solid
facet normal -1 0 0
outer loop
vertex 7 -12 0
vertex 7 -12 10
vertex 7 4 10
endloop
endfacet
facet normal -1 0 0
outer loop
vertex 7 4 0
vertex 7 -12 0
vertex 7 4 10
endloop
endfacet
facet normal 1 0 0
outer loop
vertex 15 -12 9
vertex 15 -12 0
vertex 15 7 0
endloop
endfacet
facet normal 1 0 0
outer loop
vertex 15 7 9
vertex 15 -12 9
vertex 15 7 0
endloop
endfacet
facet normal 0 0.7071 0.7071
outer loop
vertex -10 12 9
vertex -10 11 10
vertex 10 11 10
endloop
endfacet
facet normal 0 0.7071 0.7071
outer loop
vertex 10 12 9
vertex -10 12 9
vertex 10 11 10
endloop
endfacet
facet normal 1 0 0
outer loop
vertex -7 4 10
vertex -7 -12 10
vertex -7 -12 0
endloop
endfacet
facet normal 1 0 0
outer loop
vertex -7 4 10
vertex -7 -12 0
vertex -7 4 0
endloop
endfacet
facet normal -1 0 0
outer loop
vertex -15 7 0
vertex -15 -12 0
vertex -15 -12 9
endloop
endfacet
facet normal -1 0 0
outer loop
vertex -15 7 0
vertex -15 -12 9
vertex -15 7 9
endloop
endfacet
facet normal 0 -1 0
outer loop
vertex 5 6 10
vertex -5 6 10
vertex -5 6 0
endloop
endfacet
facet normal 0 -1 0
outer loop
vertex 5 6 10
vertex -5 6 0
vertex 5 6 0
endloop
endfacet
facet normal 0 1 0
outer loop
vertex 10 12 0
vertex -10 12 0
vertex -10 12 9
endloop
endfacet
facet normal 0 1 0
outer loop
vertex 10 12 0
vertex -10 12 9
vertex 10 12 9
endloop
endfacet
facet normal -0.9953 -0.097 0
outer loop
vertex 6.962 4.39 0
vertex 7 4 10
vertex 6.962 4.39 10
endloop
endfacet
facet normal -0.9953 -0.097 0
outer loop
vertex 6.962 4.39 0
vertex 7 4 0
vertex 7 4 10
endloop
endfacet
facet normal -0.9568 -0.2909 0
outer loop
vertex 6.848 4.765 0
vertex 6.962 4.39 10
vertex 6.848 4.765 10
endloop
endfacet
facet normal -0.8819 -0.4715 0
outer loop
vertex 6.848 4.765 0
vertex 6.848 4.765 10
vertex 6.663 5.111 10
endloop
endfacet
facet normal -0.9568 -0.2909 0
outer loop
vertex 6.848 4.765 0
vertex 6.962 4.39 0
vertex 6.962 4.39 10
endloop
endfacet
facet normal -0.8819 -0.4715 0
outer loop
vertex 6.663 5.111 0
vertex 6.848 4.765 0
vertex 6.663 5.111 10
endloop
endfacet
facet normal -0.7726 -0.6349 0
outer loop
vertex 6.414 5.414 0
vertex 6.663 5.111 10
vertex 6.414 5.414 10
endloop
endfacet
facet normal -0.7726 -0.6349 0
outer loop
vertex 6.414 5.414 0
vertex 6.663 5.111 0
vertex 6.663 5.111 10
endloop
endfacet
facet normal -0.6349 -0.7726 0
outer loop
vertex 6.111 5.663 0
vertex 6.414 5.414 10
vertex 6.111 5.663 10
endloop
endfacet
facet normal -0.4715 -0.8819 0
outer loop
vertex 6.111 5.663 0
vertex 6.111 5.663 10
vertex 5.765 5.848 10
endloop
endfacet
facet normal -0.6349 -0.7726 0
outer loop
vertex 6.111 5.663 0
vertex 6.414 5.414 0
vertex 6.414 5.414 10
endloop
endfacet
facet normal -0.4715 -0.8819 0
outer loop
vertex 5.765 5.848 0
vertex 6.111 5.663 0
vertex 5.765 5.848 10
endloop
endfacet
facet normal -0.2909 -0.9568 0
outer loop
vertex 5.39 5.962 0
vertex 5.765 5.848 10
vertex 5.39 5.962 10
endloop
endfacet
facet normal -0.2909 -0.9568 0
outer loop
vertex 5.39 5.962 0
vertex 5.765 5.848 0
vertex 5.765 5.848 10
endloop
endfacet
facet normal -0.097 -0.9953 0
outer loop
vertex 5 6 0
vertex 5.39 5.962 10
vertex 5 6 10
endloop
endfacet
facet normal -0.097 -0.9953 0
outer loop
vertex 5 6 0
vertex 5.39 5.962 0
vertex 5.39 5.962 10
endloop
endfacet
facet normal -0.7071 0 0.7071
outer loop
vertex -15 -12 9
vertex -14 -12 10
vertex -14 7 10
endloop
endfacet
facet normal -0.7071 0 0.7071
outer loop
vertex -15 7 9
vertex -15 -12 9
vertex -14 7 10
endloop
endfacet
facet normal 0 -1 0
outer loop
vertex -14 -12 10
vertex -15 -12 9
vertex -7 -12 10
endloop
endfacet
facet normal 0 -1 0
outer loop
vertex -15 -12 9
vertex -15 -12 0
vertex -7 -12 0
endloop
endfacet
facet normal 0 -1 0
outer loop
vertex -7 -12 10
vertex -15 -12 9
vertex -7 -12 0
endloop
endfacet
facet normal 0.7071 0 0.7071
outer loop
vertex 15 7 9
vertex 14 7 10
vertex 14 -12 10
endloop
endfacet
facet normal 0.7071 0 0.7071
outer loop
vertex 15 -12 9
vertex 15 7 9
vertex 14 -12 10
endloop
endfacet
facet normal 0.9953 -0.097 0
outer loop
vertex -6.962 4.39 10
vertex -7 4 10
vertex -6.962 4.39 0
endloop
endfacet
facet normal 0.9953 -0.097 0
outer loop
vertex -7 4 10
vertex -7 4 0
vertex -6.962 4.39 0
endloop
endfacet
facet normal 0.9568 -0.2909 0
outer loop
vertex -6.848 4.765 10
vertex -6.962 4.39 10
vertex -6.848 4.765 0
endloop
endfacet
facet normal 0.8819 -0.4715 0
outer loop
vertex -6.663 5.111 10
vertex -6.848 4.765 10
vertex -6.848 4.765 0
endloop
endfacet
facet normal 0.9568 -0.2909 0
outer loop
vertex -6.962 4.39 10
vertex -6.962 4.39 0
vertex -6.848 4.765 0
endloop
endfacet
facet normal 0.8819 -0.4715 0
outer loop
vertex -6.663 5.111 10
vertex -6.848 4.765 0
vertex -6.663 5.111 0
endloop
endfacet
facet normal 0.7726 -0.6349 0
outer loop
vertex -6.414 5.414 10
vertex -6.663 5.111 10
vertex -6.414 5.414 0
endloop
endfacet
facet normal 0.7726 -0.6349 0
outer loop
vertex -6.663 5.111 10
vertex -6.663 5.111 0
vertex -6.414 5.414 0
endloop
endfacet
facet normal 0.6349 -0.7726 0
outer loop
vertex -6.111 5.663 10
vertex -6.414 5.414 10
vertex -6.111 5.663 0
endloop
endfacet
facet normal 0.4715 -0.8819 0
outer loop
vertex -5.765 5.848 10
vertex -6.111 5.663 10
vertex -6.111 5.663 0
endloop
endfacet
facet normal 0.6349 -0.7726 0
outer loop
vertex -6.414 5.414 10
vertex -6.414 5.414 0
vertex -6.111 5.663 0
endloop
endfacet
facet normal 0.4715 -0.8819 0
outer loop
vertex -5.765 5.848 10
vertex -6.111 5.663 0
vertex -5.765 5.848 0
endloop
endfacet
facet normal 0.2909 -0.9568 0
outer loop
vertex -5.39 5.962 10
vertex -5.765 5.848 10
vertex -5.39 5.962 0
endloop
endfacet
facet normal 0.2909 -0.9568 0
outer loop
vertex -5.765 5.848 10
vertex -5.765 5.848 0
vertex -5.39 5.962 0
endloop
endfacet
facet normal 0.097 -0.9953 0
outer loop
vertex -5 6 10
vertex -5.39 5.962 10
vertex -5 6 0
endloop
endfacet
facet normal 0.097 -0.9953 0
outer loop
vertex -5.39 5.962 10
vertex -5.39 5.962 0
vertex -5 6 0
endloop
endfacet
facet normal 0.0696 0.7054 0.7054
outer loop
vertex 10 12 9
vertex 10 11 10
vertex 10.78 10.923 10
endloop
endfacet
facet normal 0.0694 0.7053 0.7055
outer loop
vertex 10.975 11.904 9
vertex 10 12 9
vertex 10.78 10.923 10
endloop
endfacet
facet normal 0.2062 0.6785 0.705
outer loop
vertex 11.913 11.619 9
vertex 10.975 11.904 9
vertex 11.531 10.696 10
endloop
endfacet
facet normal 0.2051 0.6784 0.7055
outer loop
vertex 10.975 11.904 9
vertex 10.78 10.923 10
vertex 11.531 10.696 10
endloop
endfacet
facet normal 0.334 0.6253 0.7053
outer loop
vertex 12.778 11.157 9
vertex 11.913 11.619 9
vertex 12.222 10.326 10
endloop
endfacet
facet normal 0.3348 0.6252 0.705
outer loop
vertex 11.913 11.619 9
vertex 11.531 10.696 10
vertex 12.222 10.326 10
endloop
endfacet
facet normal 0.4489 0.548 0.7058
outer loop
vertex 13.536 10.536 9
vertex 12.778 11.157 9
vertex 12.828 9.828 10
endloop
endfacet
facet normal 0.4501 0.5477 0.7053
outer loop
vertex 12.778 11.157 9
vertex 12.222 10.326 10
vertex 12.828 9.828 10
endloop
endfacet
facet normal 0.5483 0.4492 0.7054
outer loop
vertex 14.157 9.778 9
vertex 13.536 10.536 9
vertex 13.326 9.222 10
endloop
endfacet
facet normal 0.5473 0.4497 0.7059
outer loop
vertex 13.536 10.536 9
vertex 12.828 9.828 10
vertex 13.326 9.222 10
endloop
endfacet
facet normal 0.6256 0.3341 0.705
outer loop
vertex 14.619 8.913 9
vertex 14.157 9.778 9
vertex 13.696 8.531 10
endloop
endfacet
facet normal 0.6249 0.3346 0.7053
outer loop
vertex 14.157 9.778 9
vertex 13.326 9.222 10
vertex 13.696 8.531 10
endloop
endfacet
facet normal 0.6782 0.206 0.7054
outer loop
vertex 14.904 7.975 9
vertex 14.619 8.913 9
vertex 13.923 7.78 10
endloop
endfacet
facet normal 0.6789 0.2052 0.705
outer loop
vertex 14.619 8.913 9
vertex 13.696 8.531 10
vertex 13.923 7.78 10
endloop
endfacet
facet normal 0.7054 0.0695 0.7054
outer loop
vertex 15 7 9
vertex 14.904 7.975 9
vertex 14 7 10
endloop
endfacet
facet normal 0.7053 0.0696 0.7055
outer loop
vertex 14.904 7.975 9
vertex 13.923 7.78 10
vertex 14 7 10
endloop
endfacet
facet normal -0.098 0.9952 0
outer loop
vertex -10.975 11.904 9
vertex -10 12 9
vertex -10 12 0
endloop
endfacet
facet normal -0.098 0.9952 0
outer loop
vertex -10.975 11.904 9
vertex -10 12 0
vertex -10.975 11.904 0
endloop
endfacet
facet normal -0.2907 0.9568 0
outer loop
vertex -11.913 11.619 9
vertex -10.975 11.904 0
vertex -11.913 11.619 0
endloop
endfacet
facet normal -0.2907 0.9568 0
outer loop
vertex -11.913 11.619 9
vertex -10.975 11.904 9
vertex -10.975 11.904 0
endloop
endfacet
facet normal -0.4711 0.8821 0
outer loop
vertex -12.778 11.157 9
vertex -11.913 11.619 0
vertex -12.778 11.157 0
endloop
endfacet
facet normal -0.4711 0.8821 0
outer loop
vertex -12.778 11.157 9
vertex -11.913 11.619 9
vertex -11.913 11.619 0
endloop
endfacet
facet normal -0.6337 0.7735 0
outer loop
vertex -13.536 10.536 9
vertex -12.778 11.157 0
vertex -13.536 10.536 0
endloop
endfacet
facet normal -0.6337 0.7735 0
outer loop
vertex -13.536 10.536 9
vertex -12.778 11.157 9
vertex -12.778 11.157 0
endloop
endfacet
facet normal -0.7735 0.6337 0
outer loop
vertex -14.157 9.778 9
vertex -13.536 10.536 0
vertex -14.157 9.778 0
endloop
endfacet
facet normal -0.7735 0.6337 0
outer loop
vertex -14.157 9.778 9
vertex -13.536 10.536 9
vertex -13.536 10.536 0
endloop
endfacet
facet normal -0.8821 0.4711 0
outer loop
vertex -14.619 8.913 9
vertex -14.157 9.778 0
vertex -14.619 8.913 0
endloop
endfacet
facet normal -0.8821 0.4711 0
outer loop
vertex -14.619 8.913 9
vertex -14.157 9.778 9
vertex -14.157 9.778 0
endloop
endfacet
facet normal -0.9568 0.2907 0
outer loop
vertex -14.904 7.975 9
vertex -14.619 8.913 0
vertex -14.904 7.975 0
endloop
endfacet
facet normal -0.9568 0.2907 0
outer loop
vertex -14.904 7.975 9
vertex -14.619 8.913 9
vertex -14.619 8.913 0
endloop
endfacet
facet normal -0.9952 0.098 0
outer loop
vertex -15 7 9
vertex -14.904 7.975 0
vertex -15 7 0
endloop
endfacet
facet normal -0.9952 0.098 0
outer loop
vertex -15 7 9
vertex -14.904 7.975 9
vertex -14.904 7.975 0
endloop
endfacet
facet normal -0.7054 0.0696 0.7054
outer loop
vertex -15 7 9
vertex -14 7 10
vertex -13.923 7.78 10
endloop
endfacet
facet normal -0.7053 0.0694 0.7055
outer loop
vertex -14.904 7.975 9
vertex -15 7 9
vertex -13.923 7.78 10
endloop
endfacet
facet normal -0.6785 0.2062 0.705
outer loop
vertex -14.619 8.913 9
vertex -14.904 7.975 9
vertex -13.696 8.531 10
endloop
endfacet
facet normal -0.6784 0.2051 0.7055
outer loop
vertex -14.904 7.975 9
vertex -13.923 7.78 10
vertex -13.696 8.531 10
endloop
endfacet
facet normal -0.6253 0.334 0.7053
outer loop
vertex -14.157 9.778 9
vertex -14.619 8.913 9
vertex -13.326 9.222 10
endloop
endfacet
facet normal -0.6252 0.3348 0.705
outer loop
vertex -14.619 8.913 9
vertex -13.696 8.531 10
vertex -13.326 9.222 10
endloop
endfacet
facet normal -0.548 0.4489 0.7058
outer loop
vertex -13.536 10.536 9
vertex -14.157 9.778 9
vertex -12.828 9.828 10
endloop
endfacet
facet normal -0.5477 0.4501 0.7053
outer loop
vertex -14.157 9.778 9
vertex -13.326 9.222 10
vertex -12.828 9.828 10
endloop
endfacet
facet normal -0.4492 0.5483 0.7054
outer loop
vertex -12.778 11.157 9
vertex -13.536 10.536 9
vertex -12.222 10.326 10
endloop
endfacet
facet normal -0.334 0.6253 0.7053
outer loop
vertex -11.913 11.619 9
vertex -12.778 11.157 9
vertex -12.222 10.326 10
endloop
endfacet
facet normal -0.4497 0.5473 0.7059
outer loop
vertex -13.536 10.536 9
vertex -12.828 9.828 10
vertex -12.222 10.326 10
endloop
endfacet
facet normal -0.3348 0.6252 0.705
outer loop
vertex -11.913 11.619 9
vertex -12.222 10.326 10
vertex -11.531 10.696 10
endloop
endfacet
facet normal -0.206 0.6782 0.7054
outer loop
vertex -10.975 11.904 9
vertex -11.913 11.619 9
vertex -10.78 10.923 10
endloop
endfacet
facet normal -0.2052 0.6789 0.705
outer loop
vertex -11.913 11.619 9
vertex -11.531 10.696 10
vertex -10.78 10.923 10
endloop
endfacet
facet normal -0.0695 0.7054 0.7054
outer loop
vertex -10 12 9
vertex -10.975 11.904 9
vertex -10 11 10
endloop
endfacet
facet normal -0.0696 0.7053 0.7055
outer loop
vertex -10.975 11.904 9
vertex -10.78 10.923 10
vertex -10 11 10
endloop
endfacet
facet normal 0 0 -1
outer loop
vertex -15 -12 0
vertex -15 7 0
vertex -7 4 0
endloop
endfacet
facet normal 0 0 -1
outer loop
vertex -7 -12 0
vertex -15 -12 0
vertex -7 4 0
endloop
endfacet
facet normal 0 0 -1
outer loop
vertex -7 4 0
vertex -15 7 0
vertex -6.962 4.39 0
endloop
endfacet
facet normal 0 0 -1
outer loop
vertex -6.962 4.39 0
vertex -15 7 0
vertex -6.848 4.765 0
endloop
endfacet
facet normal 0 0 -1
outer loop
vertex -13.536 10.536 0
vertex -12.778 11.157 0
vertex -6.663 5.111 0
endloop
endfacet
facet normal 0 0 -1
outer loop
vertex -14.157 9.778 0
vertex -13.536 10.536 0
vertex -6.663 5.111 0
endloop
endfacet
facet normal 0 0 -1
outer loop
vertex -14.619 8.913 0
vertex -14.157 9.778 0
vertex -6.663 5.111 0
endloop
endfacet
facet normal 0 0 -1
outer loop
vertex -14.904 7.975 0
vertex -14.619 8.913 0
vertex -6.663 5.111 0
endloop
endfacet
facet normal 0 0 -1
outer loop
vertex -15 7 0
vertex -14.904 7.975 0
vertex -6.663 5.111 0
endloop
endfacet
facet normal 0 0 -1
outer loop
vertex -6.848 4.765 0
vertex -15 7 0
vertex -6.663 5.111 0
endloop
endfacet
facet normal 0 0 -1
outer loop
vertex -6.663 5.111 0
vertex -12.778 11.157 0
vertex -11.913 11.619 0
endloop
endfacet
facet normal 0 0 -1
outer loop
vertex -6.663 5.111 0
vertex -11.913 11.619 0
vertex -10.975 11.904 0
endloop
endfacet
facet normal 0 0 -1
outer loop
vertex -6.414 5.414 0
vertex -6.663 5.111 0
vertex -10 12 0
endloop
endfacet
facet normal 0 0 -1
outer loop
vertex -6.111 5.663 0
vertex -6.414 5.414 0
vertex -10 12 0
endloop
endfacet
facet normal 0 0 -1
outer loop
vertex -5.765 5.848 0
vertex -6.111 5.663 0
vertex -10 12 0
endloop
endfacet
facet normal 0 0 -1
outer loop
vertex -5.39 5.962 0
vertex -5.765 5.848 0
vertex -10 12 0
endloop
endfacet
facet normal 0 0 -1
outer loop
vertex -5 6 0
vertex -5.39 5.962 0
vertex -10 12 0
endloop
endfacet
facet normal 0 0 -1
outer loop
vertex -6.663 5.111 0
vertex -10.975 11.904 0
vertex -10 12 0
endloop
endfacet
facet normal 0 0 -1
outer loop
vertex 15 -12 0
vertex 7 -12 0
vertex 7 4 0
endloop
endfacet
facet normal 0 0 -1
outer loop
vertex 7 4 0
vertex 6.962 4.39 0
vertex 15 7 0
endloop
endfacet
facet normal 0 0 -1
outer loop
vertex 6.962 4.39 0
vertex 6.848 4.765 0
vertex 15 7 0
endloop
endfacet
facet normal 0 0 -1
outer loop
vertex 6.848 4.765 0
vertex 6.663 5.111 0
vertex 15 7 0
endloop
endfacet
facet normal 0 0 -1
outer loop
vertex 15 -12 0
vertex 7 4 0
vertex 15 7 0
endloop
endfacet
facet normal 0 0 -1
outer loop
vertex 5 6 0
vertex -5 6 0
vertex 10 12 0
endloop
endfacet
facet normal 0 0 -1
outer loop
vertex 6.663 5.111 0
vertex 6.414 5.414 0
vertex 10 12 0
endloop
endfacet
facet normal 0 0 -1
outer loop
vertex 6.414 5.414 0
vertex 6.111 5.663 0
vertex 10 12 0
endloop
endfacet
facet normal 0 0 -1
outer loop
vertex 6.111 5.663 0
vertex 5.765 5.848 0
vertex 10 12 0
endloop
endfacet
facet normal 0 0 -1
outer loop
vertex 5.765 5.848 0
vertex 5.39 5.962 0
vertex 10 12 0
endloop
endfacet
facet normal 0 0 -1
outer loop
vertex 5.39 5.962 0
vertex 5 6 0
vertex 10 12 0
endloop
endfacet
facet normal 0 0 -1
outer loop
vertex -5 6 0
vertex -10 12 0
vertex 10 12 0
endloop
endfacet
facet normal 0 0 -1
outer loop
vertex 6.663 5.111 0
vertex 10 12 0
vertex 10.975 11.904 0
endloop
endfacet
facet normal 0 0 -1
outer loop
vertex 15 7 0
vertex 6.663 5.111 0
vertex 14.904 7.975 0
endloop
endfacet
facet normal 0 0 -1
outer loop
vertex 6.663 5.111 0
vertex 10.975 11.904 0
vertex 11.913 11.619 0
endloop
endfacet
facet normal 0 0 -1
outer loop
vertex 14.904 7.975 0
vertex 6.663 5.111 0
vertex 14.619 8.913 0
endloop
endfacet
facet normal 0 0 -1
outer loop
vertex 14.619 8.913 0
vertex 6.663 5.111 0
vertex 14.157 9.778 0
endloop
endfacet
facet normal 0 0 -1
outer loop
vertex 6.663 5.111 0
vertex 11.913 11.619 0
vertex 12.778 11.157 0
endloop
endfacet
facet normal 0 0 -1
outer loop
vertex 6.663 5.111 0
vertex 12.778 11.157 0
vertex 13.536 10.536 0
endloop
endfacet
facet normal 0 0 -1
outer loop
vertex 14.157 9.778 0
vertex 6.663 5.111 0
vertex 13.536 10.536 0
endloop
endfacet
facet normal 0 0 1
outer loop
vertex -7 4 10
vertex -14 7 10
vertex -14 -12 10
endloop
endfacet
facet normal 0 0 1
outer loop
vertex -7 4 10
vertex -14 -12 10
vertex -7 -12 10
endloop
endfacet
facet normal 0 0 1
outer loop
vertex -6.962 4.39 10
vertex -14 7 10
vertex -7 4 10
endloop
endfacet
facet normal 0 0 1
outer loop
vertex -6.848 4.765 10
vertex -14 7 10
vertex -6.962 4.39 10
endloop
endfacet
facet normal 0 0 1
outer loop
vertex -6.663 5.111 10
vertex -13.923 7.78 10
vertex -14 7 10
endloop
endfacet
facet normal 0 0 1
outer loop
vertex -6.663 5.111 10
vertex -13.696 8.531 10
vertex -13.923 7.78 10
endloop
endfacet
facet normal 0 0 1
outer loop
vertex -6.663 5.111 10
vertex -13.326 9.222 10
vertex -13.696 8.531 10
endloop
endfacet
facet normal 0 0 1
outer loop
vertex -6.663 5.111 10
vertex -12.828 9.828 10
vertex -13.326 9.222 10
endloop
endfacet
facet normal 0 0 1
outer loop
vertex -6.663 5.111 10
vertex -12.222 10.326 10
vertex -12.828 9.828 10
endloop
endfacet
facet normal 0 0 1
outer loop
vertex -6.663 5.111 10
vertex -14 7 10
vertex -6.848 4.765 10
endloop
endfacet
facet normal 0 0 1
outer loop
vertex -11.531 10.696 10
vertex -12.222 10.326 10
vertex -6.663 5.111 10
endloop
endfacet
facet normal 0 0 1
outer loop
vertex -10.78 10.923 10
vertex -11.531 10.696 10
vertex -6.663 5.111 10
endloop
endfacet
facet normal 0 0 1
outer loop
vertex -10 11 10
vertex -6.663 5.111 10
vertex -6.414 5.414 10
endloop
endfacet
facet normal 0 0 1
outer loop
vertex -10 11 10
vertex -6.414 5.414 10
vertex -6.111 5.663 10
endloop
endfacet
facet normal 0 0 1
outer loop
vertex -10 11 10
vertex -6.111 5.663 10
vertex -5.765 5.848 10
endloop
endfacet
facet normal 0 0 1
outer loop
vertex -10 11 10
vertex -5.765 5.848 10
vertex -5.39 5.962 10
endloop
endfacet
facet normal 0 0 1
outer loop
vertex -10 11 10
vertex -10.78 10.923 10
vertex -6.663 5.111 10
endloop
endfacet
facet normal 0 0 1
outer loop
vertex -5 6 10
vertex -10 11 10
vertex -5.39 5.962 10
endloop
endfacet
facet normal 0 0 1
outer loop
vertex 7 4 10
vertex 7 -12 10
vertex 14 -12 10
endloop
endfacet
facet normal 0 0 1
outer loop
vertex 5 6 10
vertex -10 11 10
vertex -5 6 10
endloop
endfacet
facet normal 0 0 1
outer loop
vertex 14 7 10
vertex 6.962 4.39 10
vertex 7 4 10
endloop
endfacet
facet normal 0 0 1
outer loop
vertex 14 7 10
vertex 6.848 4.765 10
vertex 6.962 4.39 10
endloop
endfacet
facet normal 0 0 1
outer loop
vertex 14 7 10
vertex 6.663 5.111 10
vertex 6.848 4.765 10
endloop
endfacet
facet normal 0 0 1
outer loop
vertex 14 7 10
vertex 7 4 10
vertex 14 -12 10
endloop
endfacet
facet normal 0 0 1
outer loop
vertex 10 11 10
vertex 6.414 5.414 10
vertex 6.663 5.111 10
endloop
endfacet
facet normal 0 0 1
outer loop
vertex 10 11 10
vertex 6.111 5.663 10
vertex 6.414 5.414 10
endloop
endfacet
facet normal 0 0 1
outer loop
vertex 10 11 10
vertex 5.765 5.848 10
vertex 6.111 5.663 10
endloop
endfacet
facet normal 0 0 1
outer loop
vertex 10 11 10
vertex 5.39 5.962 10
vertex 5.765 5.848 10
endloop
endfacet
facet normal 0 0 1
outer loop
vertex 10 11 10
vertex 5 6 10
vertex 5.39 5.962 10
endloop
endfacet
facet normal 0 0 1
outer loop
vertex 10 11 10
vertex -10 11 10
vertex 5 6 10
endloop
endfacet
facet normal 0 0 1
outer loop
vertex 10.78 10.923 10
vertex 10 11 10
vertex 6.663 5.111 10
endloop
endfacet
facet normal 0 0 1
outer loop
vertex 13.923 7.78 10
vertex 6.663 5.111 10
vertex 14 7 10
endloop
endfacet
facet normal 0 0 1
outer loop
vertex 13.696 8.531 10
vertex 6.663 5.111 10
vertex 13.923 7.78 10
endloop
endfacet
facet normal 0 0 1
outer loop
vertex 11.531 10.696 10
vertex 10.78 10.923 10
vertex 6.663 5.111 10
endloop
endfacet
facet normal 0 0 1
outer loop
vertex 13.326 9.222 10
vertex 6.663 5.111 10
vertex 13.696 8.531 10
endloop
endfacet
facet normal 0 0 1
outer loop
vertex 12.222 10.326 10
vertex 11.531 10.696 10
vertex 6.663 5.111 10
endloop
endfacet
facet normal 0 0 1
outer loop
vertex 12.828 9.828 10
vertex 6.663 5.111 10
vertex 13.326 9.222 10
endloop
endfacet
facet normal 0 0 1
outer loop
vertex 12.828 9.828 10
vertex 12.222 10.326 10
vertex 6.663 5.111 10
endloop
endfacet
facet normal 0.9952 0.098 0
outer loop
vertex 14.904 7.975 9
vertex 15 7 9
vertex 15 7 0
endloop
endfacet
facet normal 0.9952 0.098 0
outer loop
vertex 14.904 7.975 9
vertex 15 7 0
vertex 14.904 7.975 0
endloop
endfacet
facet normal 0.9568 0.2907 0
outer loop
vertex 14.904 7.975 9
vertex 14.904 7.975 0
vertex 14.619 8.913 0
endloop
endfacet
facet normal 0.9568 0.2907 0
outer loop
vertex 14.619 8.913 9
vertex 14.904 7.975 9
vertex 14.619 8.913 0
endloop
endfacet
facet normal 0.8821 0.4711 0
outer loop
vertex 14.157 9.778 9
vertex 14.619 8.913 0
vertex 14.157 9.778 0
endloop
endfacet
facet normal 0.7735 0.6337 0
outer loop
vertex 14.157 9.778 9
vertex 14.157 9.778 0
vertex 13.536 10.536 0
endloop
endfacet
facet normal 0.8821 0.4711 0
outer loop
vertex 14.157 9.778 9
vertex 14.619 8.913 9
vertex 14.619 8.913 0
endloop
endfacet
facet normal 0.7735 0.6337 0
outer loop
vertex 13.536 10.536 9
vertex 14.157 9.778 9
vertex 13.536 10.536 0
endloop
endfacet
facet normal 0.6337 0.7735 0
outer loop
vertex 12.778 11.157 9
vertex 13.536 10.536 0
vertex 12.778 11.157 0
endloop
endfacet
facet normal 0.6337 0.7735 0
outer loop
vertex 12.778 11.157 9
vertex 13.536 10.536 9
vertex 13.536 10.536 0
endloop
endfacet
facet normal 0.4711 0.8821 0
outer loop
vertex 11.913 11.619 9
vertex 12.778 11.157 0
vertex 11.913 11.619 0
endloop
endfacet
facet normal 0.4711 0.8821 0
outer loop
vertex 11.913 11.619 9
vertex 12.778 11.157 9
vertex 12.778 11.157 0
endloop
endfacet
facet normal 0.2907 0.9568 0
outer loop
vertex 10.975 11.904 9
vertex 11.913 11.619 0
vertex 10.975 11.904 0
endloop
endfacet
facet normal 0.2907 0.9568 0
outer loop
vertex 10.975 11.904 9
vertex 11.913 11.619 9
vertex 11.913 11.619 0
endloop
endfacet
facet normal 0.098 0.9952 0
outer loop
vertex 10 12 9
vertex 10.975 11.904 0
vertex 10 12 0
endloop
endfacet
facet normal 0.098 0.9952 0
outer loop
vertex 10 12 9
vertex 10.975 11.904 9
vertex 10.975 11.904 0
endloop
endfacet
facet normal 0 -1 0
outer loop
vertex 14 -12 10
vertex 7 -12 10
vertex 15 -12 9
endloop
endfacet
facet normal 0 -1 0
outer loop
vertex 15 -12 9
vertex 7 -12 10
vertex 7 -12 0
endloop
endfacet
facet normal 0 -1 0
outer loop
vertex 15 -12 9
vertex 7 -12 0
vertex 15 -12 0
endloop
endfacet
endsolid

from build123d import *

# Parameters (mm, degrees)
F0_W     = 30
F0_H     = 24
F1_DEPTH = 10
F2_W     = 14
F2_H     = 18
F3_DEPTH = 10.001
F4_R     = 2
F5_R     = 5
F6_SIZE  = 1


with BuildPart() as f1:
    # F0 (on Top) → F1 (new body)
    with BuildSketch(Plane.XY):
        Rectangle(F0_W, F0_H)
    extrude(amount=F1_DEPTH)

    # F2 (on face) → F3 (cut, through all)
    with BuildSketch(Plane.XY.offset(10)):
        with Locations((0, -3)):
            Rectangle(F2_W, F2_H)
    extrude(amount=-F3_DEPTH, mode=Mode.SUBTRACT)

    # F4
    f4_edges = [f1.edges().sort_by_distance(p)[0] for p in [
        (-7, 6, 5),
        (7, 6, 5),
    ]]
    fillet(f4_edges, radius=F4_R)

    # F5
    f5_edges = [f1.edges().sort_by_distance(p)[0] for p in [
        (-15, 12, 5),
        (15, 12, 5),
    ]]
    fillet(f5_edges, radius=F5_R)

    # F6
    f6_edges = [f1.edges().sort_by_distance(p)[0] for p in [
        (0, 12, 10),
    ]]
    chamfer(f6_edges, length=F6_SIZE)


solid = f1.part
